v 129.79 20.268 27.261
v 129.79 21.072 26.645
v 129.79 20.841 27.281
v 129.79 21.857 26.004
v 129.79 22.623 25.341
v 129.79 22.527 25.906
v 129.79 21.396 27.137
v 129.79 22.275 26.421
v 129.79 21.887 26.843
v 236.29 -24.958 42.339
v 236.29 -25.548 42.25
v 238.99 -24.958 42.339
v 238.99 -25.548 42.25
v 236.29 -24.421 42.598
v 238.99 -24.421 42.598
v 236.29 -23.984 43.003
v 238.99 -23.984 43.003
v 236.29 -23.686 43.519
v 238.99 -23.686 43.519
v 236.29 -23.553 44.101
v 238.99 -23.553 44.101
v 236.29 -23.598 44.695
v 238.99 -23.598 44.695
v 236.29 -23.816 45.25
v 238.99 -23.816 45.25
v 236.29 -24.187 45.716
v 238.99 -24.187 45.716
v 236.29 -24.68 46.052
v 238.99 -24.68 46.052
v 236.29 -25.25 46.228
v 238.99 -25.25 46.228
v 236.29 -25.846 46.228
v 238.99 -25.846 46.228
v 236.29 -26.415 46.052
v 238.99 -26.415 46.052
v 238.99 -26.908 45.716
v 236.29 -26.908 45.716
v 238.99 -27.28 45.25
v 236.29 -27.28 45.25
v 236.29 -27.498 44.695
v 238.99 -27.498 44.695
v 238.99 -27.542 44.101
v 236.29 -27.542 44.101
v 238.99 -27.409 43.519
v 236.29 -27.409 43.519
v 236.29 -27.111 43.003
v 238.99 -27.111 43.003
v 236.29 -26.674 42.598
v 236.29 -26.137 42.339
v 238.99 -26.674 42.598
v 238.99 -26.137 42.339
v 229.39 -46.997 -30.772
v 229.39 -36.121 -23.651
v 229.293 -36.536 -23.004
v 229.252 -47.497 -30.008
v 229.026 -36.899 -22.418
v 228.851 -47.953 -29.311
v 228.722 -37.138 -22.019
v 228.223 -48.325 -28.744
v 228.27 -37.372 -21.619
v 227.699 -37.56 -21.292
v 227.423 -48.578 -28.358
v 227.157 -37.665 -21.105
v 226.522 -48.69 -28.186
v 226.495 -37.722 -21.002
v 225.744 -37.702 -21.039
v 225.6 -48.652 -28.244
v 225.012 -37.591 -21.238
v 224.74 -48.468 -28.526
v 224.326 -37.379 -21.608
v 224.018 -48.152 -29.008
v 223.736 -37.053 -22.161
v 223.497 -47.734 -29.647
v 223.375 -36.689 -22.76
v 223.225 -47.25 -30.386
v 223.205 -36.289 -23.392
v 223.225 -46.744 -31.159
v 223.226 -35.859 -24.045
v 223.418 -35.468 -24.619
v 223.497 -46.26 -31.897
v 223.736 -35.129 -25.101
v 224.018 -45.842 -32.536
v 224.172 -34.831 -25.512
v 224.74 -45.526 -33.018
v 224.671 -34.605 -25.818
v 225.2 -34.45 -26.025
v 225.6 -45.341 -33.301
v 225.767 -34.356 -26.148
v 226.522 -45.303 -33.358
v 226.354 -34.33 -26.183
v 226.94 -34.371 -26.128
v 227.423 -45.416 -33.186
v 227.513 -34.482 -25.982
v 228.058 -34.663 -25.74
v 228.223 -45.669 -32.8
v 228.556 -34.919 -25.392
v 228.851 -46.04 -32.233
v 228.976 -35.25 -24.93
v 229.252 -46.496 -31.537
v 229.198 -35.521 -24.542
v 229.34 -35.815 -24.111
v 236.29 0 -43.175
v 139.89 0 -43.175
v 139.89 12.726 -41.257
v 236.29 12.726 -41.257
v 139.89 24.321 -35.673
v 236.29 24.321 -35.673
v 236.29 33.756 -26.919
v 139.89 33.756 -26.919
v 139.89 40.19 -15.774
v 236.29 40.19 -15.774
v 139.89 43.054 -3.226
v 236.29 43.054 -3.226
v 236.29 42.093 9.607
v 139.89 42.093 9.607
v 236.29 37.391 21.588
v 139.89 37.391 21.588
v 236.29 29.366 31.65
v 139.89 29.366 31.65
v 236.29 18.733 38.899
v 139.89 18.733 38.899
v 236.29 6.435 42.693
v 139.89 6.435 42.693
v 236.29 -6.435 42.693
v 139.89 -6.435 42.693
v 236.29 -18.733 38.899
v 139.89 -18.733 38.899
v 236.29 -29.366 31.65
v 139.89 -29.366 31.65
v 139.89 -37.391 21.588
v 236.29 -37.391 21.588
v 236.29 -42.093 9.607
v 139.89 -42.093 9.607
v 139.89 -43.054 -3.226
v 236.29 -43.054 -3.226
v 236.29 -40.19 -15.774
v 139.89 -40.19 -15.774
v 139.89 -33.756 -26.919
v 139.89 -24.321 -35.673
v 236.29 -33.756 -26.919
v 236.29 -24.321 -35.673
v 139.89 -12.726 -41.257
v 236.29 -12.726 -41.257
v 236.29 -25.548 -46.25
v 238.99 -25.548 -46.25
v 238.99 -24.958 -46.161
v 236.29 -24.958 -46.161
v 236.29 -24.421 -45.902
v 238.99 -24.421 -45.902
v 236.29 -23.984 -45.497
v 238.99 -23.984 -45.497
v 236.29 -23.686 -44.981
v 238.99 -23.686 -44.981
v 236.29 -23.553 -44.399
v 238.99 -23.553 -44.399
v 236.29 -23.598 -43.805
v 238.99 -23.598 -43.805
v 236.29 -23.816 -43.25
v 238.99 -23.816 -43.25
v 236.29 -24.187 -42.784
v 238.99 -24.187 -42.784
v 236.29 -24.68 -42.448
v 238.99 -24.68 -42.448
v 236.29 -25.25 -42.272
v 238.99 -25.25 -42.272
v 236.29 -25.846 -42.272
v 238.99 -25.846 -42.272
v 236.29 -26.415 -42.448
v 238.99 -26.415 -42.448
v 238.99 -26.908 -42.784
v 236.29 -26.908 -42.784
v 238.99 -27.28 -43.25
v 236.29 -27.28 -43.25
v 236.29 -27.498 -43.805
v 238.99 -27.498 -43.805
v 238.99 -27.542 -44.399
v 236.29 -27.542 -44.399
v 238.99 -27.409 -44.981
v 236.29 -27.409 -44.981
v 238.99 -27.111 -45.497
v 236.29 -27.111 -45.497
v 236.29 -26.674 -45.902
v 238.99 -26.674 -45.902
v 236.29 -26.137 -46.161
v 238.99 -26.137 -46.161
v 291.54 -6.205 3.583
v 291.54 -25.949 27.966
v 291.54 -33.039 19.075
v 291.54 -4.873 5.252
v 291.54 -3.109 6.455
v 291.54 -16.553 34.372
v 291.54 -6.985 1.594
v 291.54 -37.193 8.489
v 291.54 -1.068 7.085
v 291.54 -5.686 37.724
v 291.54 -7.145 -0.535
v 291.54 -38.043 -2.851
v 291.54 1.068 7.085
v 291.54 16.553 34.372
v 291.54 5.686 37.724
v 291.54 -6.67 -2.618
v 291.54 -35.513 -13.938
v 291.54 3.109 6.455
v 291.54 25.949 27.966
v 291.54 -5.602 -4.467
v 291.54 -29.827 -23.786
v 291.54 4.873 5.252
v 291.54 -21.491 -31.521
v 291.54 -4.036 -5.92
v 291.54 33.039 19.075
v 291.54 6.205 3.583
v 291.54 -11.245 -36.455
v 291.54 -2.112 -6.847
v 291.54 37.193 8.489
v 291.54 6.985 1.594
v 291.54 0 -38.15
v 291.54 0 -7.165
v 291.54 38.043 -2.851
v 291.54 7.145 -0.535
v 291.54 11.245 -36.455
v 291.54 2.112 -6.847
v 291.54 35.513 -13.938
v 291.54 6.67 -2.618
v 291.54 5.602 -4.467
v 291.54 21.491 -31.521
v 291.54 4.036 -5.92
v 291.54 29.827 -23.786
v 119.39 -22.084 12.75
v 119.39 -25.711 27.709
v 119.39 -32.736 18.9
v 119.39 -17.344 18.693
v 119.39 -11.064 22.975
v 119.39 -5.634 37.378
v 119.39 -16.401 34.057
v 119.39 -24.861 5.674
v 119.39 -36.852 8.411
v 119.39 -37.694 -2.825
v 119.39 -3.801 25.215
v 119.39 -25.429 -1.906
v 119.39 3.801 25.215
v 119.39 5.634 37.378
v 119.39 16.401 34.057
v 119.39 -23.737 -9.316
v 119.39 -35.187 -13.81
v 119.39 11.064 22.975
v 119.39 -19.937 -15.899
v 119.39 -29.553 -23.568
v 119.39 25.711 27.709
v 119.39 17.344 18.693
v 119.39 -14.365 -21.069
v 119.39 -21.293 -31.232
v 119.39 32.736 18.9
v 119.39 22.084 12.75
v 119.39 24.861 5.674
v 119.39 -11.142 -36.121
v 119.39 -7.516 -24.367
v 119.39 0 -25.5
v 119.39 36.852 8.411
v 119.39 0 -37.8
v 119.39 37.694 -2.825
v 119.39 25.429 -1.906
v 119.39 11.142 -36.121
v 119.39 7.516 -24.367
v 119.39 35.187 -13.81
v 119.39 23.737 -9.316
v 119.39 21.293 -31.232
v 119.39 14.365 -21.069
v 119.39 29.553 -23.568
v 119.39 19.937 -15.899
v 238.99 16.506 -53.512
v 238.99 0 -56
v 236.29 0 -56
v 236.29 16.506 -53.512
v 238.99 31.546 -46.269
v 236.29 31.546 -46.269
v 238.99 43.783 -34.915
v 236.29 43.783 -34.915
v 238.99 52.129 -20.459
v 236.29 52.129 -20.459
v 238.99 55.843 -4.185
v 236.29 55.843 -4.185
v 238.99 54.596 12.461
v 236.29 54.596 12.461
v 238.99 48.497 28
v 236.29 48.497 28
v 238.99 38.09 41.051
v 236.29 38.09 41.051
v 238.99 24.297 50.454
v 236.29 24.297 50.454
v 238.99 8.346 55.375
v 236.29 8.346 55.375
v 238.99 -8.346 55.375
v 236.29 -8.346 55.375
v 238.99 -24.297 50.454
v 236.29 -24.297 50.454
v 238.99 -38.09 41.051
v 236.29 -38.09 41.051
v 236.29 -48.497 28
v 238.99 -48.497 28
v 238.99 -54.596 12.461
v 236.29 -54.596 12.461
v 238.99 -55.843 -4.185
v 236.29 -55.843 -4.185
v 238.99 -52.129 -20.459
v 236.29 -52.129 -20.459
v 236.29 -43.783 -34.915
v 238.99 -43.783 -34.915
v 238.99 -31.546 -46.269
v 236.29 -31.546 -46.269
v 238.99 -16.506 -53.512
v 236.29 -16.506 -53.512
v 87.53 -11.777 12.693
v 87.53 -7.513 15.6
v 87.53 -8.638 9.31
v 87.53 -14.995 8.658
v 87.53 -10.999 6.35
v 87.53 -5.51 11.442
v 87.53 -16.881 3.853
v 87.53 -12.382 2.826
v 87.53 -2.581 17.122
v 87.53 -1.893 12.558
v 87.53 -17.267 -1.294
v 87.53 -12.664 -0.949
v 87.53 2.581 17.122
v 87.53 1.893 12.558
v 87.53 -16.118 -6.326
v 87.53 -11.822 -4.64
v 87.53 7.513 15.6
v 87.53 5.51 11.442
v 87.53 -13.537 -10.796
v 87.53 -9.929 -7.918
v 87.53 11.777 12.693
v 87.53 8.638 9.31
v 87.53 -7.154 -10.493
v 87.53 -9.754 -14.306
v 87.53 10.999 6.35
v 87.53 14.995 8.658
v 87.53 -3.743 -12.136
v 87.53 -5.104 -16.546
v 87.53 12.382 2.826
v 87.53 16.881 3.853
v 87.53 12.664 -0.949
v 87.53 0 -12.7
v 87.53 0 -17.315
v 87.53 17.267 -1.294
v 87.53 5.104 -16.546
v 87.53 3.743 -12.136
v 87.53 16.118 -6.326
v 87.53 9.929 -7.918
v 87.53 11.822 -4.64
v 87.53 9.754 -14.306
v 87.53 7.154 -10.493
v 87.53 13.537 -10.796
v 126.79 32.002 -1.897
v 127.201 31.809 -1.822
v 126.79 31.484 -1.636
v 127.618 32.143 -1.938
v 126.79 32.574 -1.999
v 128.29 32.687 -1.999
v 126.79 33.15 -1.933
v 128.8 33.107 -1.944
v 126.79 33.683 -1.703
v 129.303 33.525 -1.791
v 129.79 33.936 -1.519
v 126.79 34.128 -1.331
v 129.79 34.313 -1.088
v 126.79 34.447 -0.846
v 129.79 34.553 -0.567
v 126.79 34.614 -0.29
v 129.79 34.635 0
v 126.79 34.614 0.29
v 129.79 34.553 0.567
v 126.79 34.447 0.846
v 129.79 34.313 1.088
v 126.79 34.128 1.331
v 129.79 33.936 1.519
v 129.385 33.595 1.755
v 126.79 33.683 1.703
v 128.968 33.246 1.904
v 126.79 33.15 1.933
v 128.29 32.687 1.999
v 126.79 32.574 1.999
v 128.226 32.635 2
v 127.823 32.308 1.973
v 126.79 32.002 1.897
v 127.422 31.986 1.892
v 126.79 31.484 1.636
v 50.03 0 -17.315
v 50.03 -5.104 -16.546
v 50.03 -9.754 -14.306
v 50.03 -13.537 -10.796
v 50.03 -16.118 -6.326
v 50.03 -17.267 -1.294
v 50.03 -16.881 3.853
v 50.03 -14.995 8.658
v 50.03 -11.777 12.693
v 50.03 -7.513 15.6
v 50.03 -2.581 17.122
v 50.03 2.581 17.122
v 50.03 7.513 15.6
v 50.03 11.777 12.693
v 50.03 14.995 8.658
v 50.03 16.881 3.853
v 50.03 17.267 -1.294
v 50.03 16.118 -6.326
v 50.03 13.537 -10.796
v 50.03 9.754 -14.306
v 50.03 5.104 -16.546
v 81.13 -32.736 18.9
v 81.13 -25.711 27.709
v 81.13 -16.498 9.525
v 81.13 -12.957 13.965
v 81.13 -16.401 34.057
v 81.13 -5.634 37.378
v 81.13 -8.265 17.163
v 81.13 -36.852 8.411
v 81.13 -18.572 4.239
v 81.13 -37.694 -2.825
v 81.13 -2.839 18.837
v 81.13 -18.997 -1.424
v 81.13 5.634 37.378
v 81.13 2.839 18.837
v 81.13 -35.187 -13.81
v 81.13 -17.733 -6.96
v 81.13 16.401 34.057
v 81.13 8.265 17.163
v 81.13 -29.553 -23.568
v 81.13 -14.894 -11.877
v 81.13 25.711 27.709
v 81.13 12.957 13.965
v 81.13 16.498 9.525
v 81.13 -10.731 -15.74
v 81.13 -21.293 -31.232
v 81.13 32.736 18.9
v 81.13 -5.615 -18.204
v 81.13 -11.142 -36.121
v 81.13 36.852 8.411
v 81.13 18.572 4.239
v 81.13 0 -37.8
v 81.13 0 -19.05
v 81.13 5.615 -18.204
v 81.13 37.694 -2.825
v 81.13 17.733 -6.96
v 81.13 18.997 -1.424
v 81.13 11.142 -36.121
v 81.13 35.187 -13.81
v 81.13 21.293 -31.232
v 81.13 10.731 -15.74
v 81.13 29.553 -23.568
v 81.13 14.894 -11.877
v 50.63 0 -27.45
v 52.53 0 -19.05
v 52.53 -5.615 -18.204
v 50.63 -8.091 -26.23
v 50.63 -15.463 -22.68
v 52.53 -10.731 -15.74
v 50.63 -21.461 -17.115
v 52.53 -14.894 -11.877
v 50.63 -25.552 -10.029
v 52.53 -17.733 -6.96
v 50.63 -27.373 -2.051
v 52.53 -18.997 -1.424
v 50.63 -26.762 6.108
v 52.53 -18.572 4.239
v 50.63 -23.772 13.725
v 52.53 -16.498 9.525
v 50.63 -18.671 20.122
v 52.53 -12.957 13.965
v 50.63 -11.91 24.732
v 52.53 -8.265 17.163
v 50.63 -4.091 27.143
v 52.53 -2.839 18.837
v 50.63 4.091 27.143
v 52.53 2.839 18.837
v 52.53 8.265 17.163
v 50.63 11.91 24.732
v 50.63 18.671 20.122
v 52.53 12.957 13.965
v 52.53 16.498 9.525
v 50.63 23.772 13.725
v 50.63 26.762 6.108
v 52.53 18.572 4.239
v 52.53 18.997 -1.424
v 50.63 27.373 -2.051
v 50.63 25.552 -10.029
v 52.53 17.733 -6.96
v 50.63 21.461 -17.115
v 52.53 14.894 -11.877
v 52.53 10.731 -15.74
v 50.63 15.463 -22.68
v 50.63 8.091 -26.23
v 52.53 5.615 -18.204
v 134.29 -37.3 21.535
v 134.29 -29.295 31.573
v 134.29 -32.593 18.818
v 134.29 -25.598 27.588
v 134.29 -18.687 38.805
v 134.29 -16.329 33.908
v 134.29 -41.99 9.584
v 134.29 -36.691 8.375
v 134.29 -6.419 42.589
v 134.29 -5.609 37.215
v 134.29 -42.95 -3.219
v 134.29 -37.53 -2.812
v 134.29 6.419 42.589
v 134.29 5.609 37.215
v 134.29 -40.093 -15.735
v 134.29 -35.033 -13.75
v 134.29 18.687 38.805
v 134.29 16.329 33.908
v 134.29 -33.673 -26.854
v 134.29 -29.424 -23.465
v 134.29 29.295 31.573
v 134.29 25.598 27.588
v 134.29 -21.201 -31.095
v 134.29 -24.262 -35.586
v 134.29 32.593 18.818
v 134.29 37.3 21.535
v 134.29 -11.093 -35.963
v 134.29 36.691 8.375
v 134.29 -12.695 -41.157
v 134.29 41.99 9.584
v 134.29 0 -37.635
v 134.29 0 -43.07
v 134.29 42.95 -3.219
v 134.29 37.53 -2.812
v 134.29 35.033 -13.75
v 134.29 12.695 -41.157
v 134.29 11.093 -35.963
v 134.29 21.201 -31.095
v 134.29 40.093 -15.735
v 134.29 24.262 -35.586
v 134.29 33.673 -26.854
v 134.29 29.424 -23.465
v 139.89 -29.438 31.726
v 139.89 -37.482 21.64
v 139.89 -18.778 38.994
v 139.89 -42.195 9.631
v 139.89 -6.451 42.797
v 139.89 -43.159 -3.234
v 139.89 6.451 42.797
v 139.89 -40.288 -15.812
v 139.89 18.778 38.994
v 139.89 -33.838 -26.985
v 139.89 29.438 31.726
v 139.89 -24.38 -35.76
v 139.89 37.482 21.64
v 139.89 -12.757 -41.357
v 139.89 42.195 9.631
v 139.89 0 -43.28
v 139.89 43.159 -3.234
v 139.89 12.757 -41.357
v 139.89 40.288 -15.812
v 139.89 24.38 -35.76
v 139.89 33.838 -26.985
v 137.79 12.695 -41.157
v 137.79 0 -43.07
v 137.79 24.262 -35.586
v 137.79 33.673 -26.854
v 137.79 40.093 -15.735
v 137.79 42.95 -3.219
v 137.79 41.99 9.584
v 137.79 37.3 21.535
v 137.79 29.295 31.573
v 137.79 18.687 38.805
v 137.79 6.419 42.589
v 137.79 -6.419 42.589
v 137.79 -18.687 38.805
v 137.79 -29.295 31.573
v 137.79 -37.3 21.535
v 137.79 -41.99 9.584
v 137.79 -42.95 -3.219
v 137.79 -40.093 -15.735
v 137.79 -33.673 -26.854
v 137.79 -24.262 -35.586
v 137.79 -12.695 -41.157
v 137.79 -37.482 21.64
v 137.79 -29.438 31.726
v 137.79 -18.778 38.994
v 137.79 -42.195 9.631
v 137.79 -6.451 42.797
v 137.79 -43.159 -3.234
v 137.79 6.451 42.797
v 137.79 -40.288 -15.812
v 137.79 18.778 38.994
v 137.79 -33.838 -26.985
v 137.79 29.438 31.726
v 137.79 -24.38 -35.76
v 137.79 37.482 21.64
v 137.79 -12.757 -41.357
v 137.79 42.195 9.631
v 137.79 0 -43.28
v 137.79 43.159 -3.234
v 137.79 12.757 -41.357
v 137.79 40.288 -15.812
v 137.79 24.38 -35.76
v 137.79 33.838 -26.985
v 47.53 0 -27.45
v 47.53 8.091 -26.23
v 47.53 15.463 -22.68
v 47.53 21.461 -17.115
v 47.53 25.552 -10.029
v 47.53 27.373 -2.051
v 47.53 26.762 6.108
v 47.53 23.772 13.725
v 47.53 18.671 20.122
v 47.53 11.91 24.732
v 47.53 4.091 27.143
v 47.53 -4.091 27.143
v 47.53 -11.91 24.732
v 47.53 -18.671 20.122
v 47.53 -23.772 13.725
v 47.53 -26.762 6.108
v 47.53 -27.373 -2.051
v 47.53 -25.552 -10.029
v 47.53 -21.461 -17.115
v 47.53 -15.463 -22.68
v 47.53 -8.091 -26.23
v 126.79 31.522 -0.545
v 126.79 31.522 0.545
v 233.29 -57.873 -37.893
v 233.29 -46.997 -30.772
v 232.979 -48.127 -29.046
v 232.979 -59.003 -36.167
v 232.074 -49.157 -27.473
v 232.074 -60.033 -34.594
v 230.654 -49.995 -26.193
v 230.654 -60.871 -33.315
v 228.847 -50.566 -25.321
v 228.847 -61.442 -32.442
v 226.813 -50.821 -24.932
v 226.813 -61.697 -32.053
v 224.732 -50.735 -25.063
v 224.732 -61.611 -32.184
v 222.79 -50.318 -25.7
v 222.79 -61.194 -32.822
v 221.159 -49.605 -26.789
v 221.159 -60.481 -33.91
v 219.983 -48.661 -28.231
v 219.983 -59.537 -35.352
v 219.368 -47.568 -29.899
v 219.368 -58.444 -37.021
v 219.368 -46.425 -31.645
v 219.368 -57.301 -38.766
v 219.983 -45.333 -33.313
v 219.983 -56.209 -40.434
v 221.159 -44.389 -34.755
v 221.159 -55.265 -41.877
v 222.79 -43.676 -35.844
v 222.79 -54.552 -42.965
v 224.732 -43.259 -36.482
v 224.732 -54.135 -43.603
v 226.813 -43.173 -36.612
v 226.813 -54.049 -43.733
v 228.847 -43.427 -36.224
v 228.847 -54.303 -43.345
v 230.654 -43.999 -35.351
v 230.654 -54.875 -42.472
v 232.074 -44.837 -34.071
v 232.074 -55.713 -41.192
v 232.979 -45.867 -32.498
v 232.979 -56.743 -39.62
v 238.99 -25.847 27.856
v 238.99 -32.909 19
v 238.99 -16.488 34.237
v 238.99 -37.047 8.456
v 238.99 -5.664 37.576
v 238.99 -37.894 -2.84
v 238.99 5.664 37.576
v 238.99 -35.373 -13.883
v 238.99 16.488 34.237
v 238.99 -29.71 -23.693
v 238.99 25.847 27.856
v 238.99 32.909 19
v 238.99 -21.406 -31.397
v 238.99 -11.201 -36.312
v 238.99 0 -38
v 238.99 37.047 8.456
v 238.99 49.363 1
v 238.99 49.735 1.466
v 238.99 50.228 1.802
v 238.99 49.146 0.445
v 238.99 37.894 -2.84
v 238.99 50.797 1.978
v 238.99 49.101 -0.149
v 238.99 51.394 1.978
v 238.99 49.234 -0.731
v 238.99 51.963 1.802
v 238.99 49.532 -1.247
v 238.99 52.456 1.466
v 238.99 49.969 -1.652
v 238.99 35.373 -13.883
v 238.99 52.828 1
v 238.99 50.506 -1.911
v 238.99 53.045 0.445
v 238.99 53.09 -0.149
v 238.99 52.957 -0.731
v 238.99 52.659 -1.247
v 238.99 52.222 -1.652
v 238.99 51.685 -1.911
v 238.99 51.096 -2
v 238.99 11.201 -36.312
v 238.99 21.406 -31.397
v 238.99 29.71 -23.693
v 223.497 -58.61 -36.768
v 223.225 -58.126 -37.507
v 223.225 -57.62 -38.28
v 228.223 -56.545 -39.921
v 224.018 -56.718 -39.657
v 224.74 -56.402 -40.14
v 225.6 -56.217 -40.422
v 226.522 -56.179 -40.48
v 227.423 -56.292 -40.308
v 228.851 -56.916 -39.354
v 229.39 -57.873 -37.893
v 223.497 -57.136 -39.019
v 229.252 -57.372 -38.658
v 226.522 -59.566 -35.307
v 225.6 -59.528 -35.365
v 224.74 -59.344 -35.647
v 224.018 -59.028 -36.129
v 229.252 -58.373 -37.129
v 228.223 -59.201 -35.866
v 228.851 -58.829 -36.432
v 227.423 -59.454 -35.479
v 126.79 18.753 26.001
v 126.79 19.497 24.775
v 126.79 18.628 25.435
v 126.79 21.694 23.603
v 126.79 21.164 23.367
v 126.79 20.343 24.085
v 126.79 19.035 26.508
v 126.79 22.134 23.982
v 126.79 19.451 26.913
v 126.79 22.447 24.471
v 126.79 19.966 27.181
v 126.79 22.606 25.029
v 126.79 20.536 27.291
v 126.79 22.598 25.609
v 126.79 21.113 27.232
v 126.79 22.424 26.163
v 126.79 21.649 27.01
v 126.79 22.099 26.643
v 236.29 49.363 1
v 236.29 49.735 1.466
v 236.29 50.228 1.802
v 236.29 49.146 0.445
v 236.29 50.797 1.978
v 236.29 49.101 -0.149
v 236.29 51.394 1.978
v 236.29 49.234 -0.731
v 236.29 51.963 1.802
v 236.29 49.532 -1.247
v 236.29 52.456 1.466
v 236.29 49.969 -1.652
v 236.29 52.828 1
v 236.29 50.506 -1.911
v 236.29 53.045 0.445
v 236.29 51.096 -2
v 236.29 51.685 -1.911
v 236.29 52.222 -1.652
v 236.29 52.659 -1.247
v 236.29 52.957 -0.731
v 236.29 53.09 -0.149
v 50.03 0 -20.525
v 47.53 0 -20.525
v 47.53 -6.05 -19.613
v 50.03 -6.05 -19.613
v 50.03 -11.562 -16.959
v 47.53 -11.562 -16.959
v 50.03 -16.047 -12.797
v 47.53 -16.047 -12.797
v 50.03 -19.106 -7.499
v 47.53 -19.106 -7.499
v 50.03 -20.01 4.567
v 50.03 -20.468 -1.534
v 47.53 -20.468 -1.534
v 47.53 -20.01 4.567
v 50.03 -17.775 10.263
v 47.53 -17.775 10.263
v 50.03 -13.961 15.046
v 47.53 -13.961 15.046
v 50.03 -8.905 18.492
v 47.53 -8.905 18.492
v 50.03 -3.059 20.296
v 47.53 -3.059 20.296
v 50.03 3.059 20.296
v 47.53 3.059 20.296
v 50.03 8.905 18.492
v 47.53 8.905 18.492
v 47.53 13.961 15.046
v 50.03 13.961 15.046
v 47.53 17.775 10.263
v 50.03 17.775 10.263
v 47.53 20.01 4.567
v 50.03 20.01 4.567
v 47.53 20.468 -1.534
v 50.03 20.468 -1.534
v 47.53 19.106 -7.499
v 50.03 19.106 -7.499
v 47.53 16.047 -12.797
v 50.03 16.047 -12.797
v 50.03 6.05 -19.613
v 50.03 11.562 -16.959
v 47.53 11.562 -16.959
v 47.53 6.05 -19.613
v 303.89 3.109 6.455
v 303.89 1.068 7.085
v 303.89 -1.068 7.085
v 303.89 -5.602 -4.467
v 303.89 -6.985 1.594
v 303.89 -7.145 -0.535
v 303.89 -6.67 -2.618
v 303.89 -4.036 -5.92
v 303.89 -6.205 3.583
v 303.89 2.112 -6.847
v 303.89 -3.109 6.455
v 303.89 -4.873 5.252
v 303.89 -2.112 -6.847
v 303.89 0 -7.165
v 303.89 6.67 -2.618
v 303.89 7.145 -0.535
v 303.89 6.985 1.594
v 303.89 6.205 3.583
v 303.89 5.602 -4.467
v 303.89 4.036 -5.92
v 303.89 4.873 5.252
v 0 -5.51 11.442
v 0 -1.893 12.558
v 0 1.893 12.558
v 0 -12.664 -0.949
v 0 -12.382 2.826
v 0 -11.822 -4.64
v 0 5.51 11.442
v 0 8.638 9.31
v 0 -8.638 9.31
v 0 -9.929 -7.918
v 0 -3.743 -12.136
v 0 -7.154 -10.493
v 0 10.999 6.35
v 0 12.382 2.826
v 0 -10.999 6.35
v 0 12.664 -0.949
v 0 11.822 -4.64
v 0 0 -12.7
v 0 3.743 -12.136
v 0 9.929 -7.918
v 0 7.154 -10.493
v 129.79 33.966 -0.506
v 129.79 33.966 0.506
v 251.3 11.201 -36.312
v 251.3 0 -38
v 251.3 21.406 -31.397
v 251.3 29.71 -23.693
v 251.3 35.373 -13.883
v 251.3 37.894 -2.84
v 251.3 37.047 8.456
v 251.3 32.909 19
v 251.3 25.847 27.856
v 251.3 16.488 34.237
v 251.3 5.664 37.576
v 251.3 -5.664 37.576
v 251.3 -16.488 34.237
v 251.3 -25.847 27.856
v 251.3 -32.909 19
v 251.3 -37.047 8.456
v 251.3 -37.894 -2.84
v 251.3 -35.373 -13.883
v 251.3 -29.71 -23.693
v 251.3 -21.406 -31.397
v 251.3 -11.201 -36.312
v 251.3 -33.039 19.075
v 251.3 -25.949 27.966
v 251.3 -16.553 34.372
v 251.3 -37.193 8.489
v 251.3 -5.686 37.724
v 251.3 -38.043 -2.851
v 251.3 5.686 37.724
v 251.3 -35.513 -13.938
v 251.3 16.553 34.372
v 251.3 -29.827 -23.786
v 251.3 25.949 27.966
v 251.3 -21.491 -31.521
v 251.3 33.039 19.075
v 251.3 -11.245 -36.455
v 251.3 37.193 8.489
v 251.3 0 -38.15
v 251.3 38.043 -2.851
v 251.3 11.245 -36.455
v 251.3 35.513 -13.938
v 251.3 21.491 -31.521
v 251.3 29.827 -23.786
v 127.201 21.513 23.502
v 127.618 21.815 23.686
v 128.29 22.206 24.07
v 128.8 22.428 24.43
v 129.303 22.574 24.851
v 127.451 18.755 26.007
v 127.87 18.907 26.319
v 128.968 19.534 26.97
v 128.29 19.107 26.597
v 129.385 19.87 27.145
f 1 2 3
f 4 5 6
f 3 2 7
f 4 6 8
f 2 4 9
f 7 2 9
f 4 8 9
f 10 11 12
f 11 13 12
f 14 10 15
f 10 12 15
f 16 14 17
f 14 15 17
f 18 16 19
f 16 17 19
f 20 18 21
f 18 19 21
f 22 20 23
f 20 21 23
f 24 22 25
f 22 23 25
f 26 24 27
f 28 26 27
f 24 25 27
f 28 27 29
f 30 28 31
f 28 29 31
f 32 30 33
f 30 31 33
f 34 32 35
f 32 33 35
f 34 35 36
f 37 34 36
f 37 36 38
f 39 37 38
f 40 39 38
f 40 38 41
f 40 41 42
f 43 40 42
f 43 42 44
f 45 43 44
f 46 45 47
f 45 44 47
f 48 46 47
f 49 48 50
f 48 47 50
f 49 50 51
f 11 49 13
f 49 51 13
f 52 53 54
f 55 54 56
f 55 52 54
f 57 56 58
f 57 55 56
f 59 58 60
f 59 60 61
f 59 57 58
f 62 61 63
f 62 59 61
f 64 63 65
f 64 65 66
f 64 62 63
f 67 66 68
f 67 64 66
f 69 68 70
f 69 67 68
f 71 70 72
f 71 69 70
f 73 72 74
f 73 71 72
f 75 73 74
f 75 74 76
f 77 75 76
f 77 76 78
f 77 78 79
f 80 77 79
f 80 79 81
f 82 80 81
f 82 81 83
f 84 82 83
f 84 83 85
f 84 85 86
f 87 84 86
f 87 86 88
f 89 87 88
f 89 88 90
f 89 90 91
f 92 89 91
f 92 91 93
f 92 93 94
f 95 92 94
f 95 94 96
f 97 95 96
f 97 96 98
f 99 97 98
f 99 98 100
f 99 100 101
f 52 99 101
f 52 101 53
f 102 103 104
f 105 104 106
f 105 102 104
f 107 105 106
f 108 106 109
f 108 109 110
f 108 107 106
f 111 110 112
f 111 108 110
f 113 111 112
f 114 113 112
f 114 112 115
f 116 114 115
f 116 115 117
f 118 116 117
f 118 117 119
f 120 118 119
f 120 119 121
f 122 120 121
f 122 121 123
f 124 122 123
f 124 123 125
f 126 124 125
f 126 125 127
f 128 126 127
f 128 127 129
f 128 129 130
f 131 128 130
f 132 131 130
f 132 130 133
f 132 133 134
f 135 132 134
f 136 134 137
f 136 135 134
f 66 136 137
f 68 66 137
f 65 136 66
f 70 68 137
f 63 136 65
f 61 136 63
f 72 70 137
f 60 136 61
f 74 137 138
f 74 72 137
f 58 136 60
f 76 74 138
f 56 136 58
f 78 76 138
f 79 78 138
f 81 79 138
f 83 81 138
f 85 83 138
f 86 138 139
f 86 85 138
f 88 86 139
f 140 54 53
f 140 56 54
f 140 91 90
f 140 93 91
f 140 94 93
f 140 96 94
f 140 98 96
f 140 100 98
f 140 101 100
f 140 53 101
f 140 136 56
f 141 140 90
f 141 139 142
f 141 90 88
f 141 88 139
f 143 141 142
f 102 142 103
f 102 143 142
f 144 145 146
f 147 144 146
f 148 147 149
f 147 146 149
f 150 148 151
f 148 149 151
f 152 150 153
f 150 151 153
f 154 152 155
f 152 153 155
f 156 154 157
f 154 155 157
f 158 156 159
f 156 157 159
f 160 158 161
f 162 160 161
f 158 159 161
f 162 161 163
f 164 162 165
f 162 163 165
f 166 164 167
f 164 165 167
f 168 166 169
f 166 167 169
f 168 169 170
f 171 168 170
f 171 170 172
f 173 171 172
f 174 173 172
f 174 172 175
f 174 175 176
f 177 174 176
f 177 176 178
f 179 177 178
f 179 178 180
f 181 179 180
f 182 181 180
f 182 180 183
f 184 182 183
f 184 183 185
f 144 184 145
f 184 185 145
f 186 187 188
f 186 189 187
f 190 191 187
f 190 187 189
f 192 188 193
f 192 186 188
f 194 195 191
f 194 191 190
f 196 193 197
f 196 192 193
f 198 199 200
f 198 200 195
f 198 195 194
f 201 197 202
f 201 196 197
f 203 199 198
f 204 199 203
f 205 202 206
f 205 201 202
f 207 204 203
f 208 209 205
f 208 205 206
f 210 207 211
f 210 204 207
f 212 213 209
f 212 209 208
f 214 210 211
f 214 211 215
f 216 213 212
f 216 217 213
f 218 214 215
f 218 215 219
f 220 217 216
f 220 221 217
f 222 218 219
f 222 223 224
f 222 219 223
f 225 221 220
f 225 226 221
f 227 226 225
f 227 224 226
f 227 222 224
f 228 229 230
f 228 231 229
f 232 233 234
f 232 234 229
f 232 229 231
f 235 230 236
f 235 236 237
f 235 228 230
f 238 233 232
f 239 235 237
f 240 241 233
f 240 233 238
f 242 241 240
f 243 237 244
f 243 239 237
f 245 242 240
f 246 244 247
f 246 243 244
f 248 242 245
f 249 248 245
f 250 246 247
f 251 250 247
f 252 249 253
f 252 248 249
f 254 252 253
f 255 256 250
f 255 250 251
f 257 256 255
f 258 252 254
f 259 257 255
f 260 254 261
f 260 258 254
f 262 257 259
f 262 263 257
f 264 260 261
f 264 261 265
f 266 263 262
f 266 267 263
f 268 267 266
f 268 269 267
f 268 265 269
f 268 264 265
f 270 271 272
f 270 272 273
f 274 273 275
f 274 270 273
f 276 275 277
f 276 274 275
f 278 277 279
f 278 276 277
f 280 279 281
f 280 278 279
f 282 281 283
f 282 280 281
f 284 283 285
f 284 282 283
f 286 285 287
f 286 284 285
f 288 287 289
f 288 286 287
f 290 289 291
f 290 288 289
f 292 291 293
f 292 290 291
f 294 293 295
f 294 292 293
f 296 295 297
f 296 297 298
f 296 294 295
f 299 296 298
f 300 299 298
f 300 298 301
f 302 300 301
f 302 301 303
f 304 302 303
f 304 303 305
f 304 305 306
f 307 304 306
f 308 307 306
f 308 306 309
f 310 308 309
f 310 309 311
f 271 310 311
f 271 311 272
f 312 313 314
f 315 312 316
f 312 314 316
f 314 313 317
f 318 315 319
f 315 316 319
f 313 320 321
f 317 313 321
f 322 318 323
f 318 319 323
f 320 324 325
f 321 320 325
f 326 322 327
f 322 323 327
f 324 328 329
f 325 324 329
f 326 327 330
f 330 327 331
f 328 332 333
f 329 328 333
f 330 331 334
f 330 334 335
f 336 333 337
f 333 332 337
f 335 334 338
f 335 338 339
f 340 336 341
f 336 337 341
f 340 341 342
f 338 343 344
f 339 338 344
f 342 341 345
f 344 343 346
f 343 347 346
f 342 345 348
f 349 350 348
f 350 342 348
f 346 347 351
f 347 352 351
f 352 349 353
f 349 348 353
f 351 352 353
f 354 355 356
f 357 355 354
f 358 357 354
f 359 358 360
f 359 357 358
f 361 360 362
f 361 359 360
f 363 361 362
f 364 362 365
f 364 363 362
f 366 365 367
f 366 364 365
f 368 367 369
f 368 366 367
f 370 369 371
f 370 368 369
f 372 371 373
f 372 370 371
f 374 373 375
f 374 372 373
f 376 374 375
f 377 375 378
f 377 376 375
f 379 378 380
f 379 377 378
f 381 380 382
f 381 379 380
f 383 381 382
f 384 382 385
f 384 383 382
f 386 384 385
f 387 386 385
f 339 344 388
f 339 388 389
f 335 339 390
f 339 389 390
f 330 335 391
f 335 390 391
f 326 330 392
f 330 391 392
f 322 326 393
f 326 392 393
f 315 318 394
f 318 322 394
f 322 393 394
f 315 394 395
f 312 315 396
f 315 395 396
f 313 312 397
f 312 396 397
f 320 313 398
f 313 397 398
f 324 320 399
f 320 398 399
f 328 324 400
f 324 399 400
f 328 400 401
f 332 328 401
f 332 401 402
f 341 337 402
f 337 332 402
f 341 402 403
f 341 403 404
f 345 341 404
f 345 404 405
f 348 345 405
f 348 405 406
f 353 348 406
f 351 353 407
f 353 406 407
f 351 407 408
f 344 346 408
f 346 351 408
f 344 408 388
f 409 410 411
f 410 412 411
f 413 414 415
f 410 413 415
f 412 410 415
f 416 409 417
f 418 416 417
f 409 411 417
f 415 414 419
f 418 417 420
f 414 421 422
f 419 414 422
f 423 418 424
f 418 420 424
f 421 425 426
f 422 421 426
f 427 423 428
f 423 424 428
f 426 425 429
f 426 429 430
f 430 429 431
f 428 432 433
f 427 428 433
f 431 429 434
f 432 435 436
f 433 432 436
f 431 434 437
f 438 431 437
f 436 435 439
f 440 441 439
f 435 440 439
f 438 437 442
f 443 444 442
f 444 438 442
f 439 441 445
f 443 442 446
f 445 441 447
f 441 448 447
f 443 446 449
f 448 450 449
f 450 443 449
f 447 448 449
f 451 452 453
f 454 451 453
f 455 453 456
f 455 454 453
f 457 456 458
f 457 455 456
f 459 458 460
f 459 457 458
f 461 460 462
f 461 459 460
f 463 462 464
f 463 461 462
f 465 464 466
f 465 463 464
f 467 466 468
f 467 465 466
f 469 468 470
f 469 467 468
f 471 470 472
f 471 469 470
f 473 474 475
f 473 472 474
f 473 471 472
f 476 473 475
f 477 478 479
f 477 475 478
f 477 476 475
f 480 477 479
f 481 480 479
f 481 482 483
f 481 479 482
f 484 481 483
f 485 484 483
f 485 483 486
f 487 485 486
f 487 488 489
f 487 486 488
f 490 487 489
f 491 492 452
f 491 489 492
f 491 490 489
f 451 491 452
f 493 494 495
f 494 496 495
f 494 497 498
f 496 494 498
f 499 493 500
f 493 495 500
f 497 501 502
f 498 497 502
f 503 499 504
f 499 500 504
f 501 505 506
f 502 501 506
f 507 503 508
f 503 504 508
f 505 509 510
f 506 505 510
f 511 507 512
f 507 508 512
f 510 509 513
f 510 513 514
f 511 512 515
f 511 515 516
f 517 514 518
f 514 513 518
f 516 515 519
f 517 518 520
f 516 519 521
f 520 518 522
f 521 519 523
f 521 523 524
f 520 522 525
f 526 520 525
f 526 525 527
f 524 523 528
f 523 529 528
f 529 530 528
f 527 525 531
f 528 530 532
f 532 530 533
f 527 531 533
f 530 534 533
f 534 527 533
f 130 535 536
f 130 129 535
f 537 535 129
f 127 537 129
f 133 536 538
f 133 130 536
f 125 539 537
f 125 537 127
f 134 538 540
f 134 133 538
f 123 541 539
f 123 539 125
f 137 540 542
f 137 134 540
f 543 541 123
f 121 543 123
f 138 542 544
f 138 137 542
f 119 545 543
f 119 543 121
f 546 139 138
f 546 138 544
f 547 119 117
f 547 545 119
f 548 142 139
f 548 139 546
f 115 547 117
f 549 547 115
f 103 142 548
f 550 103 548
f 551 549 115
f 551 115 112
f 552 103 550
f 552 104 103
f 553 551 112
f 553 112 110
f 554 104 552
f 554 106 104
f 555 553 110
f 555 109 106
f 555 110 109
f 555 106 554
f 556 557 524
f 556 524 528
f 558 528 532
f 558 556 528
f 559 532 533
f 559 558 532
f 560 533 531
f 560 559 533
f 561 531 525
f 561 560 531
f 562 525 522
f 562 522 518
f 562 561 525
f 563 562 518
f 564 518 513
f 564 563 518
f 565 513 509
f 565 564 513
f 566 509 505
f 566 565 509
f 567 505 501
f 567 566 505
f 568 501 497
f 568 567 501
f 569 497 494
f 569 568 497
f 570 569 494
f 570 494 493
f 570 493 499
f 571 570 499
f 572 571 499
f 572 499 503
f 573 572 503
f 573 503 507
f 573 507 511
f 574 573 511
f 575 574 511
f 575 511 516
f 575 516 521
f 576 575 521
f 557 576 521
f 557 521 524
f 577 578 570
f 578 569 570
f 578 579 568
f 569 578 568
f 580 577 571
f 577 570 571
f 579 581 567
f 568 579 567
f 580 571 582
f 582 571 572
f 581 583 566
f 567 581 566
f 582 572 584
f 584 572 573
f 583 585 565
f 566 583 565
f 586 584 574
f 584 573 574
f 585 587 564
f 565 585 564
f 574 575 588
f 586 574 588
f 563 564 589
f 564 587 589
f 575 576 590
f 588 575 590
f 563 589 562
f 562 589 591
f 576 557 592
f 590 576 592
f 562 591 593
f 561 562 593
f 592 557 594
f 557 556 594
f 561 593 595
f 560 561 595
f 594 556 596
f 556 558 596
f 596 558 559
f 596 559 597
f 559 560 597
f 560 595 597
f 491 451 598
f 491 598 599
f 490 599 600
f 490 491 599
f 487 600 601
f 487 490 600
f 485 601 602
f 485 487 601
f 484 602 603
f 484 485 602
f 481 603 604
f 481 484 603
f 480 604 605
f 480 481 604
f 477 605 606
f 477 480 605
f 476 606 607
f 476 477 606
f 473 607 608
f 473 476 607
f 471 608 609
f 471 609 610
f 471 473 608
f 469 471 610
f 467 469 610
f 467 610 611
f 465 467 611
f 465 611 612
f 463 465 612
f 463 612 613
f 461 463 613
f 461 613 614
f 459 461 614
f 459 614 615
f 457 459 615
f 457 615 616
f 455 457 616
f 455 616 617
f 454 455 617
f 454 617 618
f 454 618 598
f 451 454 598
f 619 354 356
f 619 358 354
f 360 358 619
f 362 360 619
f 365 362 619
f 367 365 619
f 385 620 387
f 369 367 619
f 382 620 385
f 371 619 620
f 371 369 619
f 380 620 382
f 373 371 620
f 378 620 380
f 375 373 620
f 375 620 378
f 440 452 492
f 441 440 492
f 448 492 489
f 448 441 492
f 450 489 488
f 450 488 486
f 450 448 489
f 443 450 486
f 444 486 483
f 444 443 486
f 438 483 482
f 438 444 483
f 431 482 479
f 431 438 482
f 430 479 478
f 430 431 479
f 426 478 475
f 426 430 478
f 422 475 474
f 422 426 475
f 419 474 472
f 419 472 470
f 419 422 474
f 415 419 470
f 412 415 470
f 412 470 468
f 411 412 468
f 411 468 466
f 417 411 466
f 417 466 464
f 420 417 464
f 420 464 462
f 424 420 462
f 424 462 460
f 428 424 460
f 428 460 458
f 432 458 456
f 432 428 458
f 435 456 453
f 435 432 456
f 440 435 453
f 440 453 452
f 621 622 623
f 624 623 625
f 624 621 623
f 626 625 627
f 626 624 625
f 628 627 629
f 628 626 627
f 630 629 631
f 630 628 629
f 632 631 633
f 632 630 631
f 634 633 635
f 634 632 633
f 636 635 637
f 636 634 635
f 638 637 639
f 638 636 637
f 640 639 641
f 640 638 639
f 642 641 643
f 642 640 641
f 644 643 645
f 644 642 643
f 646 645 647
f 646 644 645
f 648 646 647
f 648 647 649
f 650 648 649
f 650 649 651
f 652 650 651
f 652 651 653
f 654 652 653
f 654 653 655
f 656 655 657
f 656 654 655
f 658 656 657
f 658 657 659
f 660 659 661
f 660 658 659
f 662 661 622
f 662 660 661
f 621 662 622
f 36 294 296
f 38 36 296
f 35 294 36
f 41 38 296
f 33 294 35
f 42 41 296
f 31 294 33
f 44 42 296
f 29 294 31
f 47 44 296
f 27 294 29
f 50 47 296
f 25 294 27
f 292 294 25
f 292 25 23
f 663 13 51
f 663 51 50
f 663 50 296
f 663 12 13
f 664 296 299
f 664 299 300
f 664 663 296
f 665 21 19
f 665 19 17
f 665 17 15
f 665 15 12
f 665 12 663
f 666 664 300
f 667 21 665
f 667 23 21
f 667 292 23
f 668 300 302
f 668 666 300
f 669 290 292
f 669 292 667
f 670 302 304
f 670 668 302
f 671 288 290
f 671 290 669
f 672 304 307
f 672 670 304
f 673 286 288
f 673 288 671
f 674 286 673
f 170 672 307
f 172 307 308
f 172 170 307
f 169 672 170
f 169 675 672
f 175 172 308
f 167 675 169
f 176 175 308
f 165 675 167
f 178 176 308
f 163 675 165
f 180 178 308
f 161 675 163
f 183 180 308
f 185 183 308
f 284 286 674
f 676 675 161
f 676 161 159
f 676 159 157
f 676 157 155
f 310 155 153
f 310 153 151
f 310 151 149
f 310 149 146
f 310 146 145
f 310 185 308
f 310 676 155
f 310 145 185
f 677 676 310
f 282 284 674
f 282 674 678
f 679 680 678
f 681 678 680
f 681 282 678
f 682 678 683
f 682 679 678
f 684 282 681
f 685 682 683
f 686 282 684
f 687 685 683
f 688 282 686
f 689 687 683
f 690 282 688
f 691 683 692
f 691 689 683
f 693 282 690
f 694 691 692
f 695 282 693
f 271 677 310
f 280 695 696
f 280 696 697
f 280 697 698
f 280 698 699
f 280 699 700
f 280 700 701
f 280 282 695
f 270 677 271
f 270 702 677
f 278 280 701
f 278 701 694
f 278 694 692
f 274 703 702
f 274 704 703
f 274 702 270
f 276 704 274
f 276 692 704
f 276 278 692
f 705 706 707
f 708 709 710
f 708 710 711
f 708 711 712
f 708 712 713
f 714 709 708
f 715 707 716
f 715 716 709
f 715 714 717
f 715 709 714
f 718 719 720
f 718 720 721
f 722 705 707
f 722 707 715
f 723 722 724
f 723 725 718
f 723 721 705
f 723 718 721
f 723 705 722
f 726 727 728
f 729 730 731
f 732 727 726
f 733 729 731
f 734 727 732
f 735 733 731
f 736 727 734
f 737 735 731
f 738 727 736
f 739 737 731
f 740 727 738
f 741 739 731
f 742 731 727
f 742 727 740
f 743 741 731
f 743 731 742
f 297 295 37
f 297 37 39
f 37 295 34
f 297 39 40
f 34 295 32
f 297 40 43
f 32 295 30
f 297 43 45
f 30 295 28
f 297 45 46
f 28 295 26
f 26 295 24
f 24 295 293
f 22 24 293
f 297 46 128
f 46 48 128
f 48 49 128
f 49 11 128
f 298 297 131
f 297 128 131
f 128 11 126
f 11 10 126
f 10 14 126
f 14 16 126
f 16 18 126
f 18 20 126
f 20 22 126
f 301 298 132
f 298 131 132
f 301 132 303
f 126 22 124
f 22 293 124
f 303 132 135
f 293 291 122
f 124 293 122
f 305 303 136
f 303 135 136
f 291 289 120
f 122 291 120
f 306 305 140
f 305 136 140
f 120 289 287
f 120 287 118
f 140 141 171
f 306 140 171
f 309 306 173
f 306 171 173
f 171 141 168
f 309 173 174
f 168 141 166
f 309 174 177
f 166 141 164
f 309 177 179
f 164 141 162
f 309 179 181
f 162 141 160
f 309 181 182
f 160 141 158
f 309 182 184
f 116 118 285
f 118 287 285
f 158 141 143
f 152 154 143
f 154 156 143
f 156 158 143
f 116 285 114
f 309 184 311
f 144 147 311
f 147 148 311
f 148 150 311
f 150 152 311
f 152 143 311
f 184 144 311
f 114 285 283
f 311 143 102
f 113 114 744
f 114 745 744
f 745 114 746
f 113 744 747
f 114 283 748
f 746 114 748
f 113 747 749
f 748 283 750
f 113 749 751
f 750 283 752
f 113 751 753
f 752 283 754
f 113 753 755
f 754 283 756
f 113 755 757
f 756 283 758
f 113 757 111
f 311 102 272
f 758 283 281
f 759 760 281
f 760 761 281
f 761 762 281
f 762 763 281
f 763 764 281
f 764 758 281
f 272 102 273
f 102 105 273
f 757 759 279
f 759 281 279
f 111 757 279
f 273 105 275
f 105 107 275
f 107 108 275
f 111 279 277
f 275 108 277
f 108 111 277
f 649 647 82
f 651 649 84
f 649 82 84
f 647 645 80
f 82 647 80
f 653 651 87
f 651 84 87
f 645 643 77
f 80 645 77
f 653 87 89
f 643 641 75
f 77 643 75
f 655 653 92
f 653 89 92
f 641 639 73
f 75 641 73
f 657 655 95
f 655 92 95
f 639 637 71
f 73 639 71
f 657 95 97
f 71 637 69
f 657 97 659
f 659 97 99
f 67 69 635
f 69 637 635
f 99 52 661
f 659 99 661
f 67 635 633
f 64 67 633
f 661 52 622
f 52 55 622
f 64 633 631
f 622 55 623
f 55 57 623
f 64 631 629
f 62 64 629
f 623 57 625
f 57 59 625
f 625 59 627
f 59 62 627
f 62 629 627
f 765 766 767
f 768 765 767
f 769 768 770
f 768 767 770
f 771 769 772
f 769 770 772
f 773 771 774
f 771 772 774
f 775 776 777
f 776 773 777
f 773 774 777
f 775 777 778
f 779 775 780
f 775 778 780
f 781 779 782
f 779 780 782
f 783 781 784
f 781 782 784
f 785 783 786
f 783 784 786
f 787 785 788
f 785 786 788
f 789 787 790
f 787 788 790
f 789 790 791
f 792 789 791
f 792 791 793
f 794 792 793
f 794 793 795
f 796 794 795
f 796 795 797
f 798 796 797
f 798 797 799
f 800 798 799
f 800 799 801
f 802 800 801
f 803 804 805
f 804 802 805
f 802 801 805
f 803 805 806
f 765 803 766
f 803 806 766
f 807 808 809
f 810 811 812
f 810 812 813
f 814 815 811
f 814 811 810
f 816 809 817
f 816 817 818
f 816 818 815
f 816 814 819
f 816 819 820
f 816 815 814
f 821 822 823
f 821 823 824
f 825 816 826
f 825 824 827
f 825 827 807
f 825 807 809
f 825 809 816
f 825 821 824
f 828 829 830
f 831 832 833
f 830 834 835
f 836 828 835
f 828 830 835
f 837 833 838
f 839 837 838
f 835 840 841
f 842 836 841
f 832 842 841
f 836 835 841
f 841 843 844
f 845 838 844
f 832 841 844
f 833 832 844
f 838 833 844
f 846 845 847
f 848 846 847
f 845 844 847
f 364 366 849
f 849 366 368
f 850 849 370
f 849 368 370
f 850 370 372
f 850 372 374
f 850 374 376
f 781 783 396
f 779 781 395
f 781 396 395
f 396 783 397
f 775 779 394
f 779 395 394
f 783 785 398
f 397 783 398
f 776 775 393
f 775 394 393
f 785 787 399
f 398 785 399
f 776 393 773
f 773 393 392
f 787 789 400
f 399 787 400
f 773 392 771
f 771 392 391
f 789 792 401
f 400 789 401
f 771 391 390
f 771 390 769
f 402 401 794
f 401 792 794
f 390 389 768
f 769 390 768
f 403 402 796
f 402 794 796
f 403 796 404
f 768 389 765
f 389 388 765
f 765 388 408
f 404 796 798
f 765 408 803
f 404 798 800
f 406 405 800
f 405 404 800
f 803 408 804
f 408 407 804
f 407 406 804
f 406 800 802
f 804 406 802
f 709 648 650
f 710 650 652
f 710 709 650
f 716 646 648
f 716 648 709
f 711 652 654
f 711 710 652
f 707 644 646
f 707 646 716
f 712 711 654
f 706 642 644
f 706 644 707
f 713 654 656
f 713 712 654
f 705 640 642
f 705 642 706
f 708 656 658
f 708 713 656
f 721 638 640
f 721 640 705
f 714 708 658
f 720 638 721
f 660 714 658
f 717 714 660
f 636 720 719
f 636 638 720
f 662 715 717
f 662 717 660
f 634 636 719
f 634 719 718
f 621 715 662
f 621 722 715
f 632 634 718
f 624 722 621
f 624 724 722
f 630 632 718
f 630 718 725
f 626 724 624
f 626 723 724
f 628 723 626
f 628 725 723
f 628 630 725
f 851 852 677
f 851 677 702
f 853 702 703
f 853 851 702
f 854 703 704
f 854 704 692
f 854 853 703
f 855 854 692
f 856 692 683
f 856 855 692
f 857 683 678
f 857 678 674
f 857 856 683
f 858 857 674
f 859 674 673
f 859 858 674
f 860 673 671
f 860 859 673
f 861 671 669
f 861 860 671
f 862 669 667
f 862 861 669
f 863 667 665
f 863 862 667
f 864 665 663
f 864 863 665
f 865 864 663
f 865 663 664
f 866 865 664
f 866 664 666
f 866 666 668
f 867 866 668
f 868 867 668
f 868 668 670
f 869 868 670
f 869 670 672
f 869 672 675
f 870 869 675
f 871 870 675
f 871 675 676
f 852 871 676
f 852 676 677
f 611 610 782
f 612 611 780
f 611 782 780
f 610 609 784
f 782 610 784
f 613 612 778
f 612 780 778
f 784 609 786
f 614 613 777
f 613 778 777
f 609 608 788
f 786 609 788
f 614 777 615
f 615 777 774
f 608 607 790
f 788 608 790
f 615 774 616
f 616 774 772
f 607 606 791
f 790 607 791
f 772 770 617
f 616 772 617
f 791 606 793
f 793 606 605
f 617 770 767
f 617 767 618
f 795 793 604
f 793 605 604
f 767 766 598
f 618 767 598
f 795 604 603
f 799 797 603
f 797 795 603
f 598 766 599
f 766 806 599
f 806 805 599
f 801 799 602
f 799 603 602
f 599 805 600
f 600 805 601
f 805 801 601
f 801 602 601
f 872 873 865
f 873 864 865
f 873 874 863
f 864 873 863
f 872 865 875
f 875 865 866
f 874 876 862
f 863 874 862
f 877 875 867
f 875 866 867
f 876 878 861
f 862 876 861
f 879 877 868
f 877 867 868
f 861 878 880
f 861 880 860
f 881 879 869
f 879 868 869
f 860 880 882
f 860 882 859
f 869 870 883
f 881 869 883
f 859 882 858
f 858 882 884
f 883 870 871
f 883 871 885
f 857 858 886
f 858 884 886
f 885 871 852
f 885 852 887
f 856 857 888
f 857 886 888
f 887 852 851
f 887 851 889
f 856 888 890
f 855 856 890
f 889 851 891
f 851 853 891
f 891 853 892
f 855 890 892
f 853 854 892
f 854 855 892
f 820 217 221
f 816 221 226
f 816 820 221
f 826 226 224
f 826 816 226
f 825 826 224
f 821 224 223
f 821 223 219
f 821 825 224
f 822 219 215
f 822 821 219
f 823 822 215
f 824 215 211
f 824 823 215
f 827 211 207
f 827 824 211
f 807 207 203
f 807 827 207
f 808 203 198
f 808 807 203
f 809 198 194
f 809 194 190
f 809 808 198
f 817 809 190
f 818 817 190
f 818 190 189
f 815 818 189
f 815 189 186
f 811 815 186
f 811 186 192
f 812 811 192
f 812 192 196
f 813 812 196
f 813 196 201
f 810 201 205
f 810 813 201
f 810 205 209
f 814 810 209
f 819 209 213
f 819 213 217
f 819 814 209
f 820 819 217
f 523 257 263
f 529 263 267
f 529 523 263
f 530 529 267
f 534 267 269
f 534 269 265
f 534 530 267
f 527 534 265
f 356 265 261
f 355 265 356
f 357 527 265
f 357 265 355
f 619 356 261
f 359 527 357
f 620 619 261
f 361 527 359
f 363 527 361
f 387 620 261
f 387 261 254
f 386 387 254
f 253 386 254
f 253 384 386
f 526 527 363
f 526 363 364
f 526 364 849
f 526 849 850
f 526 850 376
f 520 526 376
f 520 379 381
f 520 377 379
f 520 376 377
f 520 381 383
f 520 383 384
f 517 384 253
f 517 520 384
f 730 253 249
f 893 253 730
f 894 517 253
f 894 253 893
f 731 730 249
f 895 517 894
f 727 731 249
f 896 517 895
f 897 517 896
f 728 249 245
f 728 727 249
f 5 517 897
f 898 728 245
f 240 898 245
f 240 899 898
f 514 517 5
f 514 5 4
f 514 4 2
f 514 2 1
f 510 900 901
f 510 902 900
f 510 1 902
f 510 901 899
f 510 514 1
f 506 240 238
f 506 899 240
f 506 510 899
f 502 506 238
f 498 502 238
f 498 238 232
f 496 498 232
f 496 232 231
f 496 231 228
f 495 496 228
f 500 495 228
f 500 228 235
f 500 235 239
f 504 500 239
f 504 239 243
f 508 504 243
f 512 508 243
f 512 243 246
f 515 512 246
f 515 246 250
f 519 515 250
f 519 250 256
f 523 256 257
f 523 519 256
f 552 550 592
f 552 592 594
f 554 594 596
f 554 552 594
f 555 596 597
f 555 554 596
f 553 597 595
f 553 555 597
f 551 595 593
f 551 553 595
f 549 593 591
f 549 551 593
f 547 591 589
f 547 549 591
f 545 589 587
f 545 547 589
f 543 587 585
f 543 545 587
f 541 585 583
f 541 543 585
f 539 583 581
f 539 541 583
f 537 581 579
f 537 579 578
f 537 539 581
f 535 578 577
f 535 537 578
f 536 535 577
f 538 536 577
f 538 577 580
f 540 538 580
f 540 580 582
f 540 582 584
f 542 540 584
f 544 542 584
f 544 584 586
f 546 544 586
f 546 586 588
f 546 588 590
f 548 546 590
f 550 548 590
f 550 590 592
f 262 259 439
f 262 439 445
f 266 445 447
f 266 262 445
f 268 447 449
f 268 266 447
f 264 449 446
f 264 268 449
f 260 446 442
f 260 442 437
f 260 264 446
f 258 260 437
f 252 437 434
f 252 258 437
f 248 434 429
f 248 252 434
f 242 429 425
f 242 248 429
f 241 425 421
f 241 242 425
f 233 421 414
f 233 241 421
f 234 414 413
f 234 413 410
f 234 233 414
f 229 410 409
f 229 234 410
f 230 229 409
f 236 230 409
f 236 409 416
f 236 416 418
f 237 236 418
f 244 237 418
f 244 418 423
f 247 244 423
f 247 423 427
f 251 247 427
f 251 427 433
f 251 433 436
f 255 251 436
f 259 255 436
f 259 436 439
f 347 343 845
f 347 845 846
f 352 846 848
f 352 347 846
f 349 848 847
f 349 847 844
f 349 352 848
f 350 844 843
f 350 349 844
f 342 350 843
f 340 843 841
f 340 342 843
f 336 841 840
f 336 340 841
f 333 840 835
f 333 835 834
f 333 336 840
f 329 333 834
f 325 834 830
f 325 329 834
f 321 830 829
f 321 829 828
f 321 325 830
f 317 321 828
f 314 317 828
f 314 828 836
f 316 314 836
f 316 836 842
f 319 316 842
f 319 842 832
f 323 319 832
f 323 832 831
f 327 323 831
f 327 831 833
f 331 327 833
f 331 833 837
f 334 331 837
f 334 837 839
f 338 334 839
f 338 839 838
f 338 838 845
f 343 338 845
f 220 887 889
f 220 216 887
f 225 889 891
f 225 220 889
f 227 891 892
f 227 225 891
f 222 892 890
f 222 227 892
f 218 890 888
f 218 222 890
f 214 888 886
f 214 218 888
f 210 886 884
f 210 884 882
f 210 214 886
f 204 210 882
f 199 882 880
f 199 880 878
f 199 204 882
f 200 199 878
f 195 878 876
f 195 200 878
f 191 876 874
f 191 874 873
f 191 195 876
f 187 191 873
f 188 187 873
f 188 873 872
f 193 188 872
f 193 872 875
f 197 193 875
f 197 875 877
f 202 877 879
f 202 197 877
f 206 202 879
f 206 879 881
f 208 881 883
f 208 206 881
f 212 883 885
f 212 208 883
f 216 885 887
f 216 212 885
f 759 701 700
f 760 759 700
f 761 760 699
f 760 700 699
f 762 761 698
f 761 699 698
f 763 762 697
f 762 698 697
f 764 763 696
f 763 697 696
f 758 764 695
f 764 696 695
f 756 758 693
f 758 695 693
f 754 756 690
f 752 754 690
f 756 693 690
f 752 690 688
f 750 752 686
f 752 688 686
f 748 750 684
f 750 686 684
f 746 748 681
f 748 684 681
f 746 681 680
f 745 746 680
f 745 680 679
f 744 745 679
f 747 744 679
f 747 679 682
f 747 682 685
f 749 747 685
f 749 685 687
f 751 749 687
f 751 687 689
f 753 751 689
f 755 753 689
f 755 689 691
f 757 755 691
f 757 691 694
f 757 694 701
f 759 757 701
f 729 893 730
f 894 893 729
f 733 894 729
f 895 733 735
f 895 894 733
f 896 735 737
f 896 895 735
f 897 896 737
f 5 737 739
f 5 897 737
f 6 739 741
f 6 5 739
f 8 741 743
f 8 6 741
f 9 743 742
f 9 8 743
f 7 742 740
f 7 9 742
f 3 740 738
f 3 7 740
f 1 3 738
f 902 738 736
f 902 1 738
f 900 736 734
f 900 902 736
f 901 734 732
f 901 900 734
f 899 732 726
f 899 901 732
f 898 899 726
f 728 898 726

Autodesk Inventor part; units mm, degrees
sketch "Sketch1" plane through (0, 0, 0) normal (0, 1, 0) x (-1, 0, 0)
  line L0 (0, 0) -> (-303.89, 0)
  line L1 (0, 0) -> (0, -12.7)
  line L2 (0, -12.7) -> (-87.53, -12.7)
  line L3 (-87.53, -12.7) -> (-87.53, -17.315)
  line L4 (-87.53, -17.315) -> (-50.03, -17.315)
  line L5 (-50.03, -17.315) -> (-50.03, -20.525)
  line L6 (-50.03, -20.525) -> (-47.53, -20.525)
  line L7 (-47.53, -20.525) -> (-47.53, -27.45)
  line L8 (-47.53, -27.45) -> (-50.63, -27.45)
  line L9 (-50.63, -27.45) -> (-52.53, -19.05)
  line L10 (-52.53, -19.05) -> (-81.13, -19.05)
  line L11 (-81.13, -19.05) -> (-81.13, -37.8)
  line L12 (-81.13, -37.8) -> (-119.39, -37.8)
  line L13 (-119.39, -37.8) -> (-119.39, -25.5)
  line L14 (-119.39, -25.5) -> (-134.29, -37.635)
  line L15 (-134.29, -37.635) -> (-134.29, -43.07)
  line L16 (-134.29, -43.07) -> (-137.79, -43.07)
  line L17 (-137.79, -43.07) -> (-137.79, -43.28)
  line L18 (-137.79, -43.28) -> (-139.89, -43.28)
  line L19 (-139.89, -43.28) -> (-139.89, -43.175)
  line L20 (-139.89, -43.175) -> (-236.29, -43.175)
  line L21 (-236.29, -43.175) -> (-236.29, -56)
  line L22 (-236.29, -56) -> (-238.99, -56)
  line L23 (-238.99, -56) -> (-238.99, 0)
  line L24 (-251.3, 0) -> (-251.3, -38.15)
  line L25 (-251.3, -38.15) -> (-291.54, -38.15)
  line L26 (-291.54, -38.15) -> (-291.54, -7.165)
  line L27 (-291.54, -7.165) -> (-303.89, -7.165)
  line L28 (-303.89, -7.165) -> (-303.89, 0)
  line L29 (-238.99, -38) -> (-251.3, -38)
  line L30 (-251.3, -38) -> (-251.3, 0)
  line L31 (-251.3, 0) -> (-238.99, 0)
  line L32 (-238.99, 0) -> (-238.99, -38)
  dimension "d0" = 303.89
  dimension "d1" = 12.7
  dimension "d2" = 87.53
  dimension "d3" = 4.615
  dimension "d4" = 37.5
  dimension "d5" = 3.21
  dimension "d6" = 2.5
  dimension "d7" = 27.45
  dimension "d8" = 3.1
  dimension "d9" = 5
  dimension "d10" = 19.05
  dimension "d11" = 30.5
  dimension "d12" = 37.8
  dimension "d13" = 38.26
  dimension "d14" = 12.3
  dimension "d16" = 14.9
  dimension "d17" = 37.635
  dimension "d18" = 43.07
  dimension "d19" = 3.5
  dimension "d20" = 43.28
  dimension "d21" = 2.1
  dimension "d22" = 43.175
  dimension "d24" = 56
  dimension "d25" = 104.7
  dimension "d26" = 12.31
  dimension "d27" = 157.25
  dimension "d28" = 38.15
  dimension "d29" = 90
  dimension "d30" = 7.165
  dimension "d31" = 12.35
  dimension "d54" = 2.7
  dimension "d55" = 38
  dimension "d77" = 25.5
  dimension "d78" = 102
revolve "Revolution1" add sketch "Sketch1" angle 360 about axis through (0, 0, 0) along (1, 0, 0)
ref_plane "Work Plane1" through (236.99, 0, 0) normal (1, 0, 0) x (0, 0, -1)
ref_plane "Work Plane2" through (236.99, 52.5583, -19.3295) normal (0, 0.9385405, -0.3451692) x (-1, 0, 0)
sketch "Sketch6" plane through (238.99, 0, 0) normal (1, 0, 0) x (0, 0, -1)
  line L0 (44.25, -25.5477) -> (-44.25, -25.5477)
  line L1 (-44.25, -25.5477) -> (0, 51.0955)
  line L2 (0, 51.0955) -> (44.25, -25.5477)
  circle A0 centre (0, 51.0955) radius 2
  circle A1 centre (44.25, -25.5477) radius 2
  circle A2 centre (-44.25, -25.5477) radius 2
  point P0 (0, 0)
  point P1 (0, 0)
  dimension "d56" = 4
  dimension "d57" = 88.5
extrude "Extrusion3" cut sketch "Sketch6" against normal up to surface (2.7 mm away) contours A2 L1 L0 | L0 L1 A2 | A1 L2 L0 | L0 L2 A1 | A0 L2 L1 | L1 L2 A0
ref_plane "Work Plane3" through (128.29, 0, 0) normal (-1, 0, 0) x (0, 0, 1)
sketch "Sketch7" plane through (128.29, 0, 0) normal (-1, 0, 0) x (0, 0, 1)
  circle A0 centre (0, 51.0955) radius 2 projected
  circle A1 centre (0, 0) radius 25.5 projected
  circle A2 centre (0, 0) radius 37.635 projected
  circle A3 centre (0, 0) radius 32.635 construction
  circle A4 centre (0, 32.635) radius 2
  circle A5 centre (25.2927, 20.6234) radius 2
  dimension "d61" = 5
  dimension "d62" = 4
  dimension "d64" = 28
extrude "Extrusion4" add sketch "Sketch7" along normal mid plane 3 contours A4 | A5
ref_plane "Work Plane4" through (226.29, 0, 0) normal (-1, 0, 0) x (0, 0, 1)
sketch "Sketch8" plane through (226.29, 0, 0) normal (-1, 0, 0) x (0, 0, 1)
  circle A0 centre (0, 0) radius 43.175 projected
  circle A1 centre (0, 0) radius 43.175 projected
  circle A2 centre (-44.25, -25.5477) radius 2 projected
  line L0 (-44.25, -25.5477) -> (-37.3906, -21.5875) construction
  point P0 (-23.6509, -36.1209)
  dimension "d68" = 20
ref_plane "Work Plane5" through (226.29, -36.1209, -23.6509) normal (0, -0.8366152, -0.547791) x (1, 0, 0)
sketch "Sketch9" plane through (226.29, -36.1209, -23.6509) normal (0, -0.8366152, -0.547791) x (1, 0, 0)
  circle A0 centre (0, 0) radius 3.1
  point P0 (-226.29, 0)
  dimension "d69" = 6.2
extrude "Extrusion5" add sketch "Sketch9" along normal blind 26 and the other way blind 1
sketch "Sketch10" plane through (226.29, -57.8729, -37.8934) normal (0, -0.8366152, -0.547791) x (1, 0, 0)
  circle A0 centre (0, 0) radius 3.1 projected
  circle A1 centre (0, 0) radius 7
  point P0 (-226.29, 0)
  dimension "d74" = 14
extrude "Extrusion6" add sketch "Sketch10" against normal blind 13 contours A0 | A1
properties part number "STI Hybrid 98 Cryocooler - Full Flange"
